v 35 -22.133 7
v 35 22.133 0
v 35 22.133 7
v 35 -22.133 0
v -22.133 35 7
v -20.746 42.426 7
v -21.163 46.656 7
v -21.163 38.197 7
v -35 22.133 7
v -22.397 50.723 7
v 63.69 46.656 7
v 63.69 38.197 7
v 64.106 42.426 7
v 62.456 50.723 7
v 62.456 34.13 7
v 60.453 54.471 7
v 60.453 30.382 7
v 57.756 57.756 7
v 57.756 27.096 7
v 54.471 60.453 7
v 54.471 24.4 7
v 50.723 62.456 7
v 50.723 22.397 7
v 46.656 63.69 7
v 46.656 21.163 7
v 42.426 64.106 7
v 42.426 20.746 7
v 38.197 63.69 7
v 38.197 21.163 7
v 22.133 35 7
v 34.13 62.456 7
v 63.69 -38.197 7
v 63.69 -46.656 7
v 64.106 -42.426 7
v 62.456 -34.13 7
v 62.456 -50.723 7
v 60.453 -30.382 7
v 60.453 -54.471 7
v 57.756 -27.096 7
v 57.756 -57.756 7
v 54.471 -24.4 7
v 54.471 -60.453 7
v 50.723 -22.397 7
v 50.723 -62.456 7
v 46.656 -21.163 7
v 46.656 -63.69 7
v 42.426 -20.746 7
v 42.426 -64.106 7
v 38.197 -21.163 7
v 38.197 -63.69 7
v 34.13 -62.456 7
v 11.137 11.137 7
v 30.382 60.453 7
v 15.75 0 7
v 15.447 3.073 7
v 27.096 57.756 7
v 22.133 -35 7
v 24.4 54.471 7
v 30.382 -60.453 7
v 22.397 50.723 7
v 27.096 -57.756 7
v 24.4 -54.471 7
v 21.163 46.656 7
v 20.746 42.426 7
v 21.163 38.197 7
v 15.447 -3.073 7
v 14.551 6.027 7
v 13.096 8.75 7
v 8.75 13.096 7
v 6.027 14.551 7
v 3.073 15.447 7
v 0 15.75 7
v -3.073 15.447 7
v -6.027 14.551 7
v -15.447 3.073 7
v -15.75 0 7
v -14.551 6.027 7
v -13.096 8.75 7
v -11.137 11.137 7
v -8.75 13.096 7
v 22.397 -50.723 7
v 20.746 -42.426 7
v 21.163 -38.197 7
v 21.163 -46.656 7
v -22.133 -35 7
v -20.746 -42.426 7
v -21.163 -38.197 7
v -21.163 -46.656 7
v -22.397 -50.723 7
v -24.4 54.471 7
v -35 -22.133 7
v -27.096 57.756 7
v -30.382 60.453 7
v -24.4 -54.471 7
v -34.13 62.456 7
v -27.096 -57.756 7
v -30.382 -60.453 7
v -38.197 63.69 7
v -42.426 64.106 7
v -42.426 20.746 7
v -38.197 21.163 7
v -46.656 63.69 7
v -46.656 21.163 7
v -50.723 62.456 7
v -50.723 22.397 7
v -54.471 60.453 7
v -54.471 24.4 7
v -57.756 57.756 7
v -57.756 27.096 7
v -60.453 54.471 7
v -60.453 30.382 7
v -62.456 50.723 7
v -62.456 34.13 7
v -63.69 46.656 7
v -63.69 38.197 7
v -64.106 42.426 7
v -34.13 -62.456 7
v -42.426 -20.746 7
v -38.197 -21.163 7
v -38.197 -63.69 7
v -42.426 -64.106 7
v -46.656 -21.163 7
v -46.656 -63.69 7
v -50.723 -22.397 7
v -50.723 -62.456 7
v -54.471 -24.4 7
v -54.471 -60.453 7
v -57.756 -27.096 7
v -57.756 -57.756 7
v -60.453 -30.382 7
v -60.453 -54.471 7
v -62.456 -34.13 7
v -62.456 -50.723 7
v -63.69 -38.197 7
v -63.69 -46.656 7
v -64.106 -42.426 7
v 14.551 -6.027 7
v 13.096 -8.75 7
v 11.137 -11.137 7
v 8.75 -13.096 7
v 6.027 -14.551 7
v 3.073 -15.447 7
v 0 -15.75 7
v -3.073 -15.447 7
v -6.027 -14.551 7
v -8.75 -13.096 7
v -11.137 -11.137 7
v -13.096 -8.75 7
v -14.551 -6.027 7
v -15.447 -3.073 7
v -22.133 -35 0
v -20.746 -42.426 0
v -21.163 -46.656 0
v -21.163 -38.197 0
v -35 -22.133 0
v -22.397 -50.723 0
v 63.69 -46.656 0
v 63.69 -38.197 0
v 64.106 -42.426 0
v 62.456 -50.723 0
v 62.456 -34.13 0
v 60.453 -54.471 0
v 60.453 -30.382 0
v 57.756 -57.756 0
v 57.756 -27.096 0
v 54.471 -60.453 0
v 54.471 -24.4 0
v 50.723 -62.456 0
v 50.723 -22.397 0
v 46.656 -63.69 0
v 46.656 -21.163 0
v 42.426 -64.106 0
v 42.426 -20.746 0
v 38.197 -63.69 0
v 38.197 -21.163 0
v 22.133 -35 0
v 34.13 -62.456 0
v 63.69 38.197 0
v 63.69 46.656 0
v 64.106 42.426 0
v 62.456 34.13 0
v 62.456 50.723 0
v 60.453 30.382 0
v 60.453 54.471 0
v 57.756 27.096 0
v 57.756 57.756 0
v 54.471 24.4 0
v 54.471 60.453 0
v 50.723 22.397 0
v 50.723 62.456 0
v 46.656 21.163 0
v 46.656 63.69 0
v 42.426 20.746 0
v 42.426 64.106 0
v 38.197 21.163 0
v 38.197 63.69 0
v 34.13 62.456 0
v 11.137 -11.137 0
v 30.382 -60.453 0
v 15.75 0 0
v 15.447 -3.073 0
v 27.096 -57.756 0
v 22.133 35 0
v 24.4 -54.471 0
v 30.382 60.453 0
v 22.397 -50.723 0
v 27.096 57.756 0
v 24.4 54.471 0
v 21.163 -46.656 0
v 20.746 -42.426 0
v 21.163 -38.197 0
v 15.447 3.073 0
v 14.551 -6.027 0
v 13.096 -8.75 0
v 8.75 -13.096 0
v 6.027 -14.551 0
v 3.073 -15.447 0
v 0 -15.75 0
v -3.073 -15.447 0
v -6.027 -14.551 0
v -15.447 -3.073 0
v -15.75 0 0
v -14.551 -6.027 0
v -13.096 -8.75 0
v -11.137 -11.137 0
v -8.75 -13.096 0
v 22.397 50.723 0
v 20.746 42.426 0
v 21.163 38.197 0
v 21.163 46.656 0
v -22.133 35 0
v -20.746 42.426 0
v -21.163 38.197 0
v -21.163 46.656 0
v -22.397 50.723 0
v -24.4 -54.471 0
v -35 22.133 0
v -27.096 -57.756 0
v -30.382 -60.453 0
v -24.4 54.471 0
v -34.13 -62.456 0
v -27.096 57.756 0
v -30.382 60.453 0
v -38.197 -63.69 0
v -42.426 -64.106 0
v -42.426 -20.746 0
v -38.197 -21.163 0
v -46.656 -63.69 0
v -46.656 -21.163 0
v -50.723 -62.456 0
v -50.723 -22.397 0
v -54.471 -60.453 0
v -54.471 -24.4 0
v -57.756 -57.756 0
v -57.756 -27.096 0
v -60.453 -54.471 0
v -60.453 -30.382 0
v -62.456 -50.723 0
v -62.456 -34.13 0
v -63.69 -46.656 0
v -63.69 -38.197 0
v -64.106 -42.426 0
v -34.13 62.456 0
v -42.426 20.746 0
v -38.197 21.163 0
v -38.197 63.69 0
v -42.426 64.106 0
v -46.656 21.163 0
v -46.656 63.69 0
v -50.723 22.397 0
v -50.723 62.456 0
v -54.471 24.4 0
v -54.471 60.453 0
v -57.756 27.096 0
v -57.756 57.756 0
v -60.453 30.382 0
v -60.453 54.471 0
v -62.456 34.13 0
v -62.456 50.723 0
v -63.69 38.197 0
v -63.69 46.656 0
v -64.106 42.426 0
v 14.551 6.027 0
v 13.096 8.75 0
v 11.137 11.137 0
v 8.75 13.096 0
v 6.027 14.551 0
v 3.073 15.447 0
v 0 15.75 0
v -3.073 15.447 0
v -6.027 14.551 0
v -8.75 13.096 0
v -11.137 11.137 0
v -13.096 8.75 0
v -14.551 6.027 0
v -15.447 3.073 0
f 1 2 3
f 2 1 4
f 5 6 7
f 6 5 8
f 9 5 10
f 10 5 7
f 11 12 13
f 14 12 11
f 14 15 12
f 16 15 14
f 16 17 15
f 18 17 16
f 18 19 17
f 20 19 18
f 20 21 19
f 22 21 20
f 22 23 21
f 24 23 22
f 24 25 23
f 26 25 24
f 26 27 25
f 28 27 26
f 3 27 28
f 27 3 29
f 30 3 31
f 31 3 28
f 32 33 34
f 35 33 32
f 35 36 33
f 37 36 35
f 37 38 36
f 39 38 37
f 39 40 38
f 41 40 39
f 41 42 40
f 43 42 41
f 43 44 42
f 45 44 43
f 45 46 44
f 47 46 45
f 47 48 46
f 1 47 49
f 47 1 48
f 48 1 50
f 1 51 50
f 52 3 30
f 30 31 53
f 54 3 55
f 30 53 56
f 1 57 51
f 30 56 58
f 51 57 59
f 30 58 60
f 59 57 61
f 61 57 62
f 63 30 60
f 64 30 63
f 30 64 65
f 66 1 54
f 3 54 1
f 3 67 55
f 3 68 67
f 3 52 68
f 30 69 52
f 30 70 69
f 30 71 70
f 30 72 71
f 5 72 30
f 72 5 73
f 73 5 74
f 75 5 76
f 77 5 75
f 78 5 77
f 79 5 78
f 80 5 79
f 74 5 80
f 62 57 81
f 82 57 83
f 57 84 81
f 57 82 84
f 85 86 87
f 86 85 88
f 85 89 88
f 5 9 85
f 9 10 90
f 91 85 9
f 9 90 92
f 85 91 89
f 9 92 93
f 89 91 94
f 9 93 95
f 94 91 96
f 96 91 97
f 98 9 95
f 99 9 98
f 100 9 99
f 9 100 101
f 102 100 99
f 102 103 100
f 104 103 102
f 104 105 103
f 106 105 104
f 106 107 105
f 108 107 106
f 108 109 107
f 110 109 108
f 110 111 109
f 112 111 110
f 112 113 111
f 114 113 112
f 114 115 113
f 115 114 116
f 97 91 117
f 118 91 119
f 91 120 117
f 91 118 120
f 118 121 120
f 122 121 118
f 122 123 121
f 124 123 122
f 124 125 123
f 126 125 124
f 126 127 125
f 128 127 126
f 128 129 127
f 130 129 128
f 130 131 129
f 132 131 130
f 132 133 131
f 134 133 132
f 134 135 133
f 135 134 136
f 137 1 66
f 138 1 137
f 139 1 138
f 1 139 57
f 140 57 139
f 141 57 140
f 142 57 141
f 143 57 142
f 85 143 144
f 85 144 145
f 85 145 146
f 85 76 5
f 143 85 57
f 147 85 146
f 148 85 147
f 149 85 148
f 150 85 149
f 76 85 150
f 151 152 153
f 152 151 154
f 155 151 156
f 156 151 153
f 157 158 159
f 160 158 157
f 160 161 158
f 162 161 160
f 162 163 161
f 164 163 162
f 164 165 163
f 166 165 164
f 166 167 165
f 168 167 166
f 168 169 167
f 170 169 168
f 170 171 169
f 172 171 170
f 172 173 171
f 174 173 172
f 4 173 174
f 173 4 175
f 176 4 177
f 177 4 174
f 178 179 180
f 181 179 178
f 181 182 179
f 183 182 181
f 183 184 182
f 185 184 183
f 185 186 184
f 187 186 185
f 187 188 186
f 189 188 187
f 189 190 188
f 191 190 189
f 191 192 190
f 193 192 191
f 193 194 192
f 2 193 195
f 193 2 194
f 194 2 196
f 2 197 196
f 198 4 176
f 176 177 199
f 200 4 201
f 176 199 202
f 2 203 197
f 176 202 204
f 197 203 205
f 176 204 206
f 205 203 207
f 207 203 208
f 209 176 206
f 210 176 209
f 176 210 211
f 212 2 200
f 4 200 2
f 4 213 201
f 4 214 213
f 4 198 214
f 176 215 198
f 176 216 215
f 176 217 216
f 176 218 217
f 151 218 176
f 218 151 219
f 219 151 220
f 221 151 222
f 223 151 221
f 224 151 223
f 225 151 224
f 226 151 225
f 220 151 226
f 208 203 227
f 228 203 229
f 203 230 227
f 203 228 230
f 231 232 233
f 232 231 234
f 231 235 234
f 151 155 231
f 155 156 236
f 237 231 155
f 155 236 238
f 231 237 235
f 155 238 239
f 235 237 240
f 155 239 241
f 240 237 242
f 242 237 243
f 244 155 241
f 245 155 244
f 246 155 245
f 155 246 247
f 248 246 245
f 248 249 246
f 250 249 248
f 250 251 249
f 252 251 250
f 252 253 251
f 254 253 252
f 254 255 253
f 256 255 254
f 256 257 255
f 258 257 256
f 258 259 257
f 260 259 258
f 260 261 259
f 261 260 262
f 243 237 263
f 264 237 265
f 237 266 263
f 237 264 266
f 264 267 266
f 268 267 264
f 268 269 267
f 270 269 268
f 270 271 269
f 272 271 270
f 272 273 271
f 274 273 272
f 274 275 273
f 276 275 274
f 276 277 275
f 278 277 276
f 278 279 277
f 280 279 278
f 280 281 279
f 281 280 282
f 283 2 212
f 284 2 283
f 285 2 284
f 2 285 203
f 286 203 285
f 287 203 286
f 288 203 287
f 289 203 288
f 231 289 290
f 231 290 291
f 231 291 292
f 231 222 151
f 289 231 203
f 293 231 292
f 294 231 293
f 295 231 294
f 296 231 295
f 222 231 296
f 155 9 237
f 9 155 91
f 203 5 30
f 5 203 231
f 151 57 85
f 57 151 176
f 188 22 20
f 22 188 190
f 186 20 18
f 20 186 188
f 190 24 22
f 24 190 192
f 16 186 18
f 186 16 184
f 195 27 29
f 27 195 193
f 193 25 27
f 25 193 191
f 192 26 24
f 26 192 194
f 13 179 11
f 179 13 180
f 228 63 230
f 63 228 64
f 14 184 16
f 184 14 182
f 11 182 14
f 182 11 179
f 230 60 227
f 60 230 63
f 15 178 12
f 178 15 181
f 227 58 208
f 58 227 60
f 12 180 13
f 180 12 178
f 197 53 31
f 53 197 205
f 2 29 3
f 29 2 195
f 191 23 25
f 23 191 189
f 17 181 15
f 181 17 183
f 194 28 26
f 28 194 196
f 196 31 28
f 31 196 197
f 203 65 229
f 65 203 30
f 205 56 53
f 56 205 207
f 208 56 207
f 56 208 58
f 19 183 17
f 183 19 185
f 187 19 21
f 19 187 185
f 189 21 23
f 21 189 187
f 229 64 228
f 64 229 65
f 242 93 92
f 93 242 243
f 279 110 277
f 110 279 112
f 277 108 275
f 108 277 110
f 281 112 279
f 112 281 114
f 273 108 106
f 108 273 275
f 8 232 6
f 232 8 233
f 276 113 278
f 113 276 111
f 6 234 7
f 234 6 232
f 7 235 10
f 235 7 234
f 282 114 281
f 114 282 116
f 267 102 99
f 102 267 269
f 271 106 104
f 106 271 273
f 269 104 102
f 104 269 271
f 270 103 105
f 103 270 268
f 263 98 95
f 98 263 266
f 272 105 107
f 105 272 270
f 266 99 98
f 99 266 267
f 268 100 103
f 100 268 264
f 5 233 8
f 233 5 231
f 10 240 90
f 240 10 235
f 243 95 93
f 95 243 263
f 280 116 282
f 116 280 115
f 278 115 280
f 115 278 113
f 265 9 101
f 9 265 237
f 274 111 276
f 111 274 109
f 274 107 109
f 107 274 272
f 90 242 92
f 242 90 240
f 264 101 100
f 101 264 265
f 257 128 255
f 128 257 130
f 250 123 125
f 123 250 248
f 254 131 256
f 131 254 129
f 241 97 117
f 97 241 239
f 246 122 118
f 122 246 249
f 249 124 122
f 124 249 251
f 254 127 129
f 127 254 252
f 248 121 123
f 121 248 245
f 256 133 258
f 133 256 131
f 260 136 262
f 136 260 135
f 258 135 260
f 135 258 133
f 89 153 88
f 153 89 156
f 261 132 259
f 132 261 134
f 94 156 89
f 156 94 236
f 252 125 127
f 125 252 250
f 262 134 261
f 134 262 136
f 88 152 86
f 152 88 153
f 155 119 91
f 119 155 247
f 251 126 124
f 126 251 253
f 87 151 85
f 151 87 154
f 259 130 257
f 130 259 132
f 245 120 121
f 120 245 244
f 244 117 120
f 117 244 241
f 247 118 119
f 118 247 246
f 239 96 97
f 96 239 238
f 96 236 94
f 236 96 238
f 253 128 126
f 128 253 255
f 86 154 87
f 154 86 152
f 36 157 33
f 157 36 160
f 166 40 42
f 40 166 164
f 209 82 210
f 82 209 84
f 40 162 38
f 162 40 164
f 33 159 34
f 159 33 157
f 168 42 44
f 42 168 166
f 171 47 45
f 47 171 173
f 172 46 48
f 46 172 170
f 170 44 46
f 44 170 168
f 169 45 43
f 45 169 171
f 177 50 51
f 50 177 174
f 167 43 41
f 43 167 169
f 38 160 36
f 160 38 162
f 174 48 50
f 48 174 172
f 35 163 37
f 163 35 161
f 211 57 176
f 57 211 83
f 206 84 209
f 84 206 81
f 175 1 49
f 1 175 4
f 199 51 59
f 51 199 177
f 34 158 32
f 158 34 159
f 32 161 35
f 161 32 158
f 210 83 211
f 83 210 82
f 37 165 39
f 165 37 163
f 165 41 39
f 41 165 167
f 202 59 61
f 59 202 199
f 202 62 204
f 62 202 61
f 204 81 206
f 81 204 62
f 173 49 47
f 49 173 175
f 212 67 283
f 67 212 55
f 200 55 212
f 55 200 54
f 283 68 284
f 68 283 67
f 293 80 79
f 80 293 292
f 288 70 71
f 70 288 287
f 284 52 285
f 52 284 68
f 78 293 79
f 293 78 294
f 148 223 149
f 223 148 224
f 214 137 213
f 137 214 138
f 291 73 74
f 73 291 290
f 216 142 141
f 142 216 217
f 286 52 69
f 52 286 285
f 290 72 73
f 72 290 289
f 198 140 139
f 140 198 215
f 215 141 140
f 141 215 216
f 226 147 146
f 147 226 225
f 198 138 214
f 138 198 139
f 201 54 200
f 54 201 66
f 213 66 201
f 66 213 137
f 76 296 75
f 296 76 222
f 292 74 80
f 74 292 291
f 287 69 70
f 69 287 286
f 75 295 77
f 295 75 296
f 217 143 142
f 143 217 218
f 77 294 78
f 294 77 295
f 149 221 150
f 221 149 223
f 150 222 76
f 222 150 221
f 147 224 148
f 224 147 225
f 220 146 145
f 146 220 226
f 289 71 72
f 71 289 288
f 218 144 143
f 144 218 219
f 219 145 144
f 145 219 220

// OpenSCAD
$fn = 32;

// ----------------------------------------------------------------------
// Quadcopter frame: 163.36 mm across the motor pads, arms 60 mm
// ----------------------------------------------------------------------

// --- parameters (mm) ---
hub = 70;                 // central plate size
plate_t = 7;              // plate thickness
arm_len = 60;             // hub centre to motor pad centre
bar_w = 10;               // arm width
pad_d = 43.36;            // motor pad diameter
centre_d = 31.5;          // central cut-out for the stack

module arm_bar() {
  /* flat bar: hull of a stub inside the hub and a box at the pad */
  hull() {
    translate([hub / 4, 0, plate_t / 2]) cube([bar_w, bar_w, plate_t], center = true);
    translate([arm_len, 0, plate_t / 2]) cube([bar_w, bar_w, plate_t], center = true);
  }
}

module pad() {
  translate([arm_len, 0, 0]) cylinder(h = plate_t, d = pad_d);
}

module frame() {
  translate([-hub / 2, -hub / 2, 0]) cube([hub, hub, plate_t]);
  rotate([0, 0, 45]) arm_bar();
  rotate([0, 0, 45]) pad();
  rotate([0, 0, 135]) arm_bar();
  rotate([0, 0, 135]) pad();
  rotate([0, 0, 225]) arm_bar();
  rotate([0, 0, 225]) pad();
  rotate([0, 0, 315]) arm_bar();
  rotate([0, 0, 315]) pad();
}

difference() {
  frame();
  translate([0, 0, -1]) cylinder(h = plate_t + 2, d = centre_d);
}
